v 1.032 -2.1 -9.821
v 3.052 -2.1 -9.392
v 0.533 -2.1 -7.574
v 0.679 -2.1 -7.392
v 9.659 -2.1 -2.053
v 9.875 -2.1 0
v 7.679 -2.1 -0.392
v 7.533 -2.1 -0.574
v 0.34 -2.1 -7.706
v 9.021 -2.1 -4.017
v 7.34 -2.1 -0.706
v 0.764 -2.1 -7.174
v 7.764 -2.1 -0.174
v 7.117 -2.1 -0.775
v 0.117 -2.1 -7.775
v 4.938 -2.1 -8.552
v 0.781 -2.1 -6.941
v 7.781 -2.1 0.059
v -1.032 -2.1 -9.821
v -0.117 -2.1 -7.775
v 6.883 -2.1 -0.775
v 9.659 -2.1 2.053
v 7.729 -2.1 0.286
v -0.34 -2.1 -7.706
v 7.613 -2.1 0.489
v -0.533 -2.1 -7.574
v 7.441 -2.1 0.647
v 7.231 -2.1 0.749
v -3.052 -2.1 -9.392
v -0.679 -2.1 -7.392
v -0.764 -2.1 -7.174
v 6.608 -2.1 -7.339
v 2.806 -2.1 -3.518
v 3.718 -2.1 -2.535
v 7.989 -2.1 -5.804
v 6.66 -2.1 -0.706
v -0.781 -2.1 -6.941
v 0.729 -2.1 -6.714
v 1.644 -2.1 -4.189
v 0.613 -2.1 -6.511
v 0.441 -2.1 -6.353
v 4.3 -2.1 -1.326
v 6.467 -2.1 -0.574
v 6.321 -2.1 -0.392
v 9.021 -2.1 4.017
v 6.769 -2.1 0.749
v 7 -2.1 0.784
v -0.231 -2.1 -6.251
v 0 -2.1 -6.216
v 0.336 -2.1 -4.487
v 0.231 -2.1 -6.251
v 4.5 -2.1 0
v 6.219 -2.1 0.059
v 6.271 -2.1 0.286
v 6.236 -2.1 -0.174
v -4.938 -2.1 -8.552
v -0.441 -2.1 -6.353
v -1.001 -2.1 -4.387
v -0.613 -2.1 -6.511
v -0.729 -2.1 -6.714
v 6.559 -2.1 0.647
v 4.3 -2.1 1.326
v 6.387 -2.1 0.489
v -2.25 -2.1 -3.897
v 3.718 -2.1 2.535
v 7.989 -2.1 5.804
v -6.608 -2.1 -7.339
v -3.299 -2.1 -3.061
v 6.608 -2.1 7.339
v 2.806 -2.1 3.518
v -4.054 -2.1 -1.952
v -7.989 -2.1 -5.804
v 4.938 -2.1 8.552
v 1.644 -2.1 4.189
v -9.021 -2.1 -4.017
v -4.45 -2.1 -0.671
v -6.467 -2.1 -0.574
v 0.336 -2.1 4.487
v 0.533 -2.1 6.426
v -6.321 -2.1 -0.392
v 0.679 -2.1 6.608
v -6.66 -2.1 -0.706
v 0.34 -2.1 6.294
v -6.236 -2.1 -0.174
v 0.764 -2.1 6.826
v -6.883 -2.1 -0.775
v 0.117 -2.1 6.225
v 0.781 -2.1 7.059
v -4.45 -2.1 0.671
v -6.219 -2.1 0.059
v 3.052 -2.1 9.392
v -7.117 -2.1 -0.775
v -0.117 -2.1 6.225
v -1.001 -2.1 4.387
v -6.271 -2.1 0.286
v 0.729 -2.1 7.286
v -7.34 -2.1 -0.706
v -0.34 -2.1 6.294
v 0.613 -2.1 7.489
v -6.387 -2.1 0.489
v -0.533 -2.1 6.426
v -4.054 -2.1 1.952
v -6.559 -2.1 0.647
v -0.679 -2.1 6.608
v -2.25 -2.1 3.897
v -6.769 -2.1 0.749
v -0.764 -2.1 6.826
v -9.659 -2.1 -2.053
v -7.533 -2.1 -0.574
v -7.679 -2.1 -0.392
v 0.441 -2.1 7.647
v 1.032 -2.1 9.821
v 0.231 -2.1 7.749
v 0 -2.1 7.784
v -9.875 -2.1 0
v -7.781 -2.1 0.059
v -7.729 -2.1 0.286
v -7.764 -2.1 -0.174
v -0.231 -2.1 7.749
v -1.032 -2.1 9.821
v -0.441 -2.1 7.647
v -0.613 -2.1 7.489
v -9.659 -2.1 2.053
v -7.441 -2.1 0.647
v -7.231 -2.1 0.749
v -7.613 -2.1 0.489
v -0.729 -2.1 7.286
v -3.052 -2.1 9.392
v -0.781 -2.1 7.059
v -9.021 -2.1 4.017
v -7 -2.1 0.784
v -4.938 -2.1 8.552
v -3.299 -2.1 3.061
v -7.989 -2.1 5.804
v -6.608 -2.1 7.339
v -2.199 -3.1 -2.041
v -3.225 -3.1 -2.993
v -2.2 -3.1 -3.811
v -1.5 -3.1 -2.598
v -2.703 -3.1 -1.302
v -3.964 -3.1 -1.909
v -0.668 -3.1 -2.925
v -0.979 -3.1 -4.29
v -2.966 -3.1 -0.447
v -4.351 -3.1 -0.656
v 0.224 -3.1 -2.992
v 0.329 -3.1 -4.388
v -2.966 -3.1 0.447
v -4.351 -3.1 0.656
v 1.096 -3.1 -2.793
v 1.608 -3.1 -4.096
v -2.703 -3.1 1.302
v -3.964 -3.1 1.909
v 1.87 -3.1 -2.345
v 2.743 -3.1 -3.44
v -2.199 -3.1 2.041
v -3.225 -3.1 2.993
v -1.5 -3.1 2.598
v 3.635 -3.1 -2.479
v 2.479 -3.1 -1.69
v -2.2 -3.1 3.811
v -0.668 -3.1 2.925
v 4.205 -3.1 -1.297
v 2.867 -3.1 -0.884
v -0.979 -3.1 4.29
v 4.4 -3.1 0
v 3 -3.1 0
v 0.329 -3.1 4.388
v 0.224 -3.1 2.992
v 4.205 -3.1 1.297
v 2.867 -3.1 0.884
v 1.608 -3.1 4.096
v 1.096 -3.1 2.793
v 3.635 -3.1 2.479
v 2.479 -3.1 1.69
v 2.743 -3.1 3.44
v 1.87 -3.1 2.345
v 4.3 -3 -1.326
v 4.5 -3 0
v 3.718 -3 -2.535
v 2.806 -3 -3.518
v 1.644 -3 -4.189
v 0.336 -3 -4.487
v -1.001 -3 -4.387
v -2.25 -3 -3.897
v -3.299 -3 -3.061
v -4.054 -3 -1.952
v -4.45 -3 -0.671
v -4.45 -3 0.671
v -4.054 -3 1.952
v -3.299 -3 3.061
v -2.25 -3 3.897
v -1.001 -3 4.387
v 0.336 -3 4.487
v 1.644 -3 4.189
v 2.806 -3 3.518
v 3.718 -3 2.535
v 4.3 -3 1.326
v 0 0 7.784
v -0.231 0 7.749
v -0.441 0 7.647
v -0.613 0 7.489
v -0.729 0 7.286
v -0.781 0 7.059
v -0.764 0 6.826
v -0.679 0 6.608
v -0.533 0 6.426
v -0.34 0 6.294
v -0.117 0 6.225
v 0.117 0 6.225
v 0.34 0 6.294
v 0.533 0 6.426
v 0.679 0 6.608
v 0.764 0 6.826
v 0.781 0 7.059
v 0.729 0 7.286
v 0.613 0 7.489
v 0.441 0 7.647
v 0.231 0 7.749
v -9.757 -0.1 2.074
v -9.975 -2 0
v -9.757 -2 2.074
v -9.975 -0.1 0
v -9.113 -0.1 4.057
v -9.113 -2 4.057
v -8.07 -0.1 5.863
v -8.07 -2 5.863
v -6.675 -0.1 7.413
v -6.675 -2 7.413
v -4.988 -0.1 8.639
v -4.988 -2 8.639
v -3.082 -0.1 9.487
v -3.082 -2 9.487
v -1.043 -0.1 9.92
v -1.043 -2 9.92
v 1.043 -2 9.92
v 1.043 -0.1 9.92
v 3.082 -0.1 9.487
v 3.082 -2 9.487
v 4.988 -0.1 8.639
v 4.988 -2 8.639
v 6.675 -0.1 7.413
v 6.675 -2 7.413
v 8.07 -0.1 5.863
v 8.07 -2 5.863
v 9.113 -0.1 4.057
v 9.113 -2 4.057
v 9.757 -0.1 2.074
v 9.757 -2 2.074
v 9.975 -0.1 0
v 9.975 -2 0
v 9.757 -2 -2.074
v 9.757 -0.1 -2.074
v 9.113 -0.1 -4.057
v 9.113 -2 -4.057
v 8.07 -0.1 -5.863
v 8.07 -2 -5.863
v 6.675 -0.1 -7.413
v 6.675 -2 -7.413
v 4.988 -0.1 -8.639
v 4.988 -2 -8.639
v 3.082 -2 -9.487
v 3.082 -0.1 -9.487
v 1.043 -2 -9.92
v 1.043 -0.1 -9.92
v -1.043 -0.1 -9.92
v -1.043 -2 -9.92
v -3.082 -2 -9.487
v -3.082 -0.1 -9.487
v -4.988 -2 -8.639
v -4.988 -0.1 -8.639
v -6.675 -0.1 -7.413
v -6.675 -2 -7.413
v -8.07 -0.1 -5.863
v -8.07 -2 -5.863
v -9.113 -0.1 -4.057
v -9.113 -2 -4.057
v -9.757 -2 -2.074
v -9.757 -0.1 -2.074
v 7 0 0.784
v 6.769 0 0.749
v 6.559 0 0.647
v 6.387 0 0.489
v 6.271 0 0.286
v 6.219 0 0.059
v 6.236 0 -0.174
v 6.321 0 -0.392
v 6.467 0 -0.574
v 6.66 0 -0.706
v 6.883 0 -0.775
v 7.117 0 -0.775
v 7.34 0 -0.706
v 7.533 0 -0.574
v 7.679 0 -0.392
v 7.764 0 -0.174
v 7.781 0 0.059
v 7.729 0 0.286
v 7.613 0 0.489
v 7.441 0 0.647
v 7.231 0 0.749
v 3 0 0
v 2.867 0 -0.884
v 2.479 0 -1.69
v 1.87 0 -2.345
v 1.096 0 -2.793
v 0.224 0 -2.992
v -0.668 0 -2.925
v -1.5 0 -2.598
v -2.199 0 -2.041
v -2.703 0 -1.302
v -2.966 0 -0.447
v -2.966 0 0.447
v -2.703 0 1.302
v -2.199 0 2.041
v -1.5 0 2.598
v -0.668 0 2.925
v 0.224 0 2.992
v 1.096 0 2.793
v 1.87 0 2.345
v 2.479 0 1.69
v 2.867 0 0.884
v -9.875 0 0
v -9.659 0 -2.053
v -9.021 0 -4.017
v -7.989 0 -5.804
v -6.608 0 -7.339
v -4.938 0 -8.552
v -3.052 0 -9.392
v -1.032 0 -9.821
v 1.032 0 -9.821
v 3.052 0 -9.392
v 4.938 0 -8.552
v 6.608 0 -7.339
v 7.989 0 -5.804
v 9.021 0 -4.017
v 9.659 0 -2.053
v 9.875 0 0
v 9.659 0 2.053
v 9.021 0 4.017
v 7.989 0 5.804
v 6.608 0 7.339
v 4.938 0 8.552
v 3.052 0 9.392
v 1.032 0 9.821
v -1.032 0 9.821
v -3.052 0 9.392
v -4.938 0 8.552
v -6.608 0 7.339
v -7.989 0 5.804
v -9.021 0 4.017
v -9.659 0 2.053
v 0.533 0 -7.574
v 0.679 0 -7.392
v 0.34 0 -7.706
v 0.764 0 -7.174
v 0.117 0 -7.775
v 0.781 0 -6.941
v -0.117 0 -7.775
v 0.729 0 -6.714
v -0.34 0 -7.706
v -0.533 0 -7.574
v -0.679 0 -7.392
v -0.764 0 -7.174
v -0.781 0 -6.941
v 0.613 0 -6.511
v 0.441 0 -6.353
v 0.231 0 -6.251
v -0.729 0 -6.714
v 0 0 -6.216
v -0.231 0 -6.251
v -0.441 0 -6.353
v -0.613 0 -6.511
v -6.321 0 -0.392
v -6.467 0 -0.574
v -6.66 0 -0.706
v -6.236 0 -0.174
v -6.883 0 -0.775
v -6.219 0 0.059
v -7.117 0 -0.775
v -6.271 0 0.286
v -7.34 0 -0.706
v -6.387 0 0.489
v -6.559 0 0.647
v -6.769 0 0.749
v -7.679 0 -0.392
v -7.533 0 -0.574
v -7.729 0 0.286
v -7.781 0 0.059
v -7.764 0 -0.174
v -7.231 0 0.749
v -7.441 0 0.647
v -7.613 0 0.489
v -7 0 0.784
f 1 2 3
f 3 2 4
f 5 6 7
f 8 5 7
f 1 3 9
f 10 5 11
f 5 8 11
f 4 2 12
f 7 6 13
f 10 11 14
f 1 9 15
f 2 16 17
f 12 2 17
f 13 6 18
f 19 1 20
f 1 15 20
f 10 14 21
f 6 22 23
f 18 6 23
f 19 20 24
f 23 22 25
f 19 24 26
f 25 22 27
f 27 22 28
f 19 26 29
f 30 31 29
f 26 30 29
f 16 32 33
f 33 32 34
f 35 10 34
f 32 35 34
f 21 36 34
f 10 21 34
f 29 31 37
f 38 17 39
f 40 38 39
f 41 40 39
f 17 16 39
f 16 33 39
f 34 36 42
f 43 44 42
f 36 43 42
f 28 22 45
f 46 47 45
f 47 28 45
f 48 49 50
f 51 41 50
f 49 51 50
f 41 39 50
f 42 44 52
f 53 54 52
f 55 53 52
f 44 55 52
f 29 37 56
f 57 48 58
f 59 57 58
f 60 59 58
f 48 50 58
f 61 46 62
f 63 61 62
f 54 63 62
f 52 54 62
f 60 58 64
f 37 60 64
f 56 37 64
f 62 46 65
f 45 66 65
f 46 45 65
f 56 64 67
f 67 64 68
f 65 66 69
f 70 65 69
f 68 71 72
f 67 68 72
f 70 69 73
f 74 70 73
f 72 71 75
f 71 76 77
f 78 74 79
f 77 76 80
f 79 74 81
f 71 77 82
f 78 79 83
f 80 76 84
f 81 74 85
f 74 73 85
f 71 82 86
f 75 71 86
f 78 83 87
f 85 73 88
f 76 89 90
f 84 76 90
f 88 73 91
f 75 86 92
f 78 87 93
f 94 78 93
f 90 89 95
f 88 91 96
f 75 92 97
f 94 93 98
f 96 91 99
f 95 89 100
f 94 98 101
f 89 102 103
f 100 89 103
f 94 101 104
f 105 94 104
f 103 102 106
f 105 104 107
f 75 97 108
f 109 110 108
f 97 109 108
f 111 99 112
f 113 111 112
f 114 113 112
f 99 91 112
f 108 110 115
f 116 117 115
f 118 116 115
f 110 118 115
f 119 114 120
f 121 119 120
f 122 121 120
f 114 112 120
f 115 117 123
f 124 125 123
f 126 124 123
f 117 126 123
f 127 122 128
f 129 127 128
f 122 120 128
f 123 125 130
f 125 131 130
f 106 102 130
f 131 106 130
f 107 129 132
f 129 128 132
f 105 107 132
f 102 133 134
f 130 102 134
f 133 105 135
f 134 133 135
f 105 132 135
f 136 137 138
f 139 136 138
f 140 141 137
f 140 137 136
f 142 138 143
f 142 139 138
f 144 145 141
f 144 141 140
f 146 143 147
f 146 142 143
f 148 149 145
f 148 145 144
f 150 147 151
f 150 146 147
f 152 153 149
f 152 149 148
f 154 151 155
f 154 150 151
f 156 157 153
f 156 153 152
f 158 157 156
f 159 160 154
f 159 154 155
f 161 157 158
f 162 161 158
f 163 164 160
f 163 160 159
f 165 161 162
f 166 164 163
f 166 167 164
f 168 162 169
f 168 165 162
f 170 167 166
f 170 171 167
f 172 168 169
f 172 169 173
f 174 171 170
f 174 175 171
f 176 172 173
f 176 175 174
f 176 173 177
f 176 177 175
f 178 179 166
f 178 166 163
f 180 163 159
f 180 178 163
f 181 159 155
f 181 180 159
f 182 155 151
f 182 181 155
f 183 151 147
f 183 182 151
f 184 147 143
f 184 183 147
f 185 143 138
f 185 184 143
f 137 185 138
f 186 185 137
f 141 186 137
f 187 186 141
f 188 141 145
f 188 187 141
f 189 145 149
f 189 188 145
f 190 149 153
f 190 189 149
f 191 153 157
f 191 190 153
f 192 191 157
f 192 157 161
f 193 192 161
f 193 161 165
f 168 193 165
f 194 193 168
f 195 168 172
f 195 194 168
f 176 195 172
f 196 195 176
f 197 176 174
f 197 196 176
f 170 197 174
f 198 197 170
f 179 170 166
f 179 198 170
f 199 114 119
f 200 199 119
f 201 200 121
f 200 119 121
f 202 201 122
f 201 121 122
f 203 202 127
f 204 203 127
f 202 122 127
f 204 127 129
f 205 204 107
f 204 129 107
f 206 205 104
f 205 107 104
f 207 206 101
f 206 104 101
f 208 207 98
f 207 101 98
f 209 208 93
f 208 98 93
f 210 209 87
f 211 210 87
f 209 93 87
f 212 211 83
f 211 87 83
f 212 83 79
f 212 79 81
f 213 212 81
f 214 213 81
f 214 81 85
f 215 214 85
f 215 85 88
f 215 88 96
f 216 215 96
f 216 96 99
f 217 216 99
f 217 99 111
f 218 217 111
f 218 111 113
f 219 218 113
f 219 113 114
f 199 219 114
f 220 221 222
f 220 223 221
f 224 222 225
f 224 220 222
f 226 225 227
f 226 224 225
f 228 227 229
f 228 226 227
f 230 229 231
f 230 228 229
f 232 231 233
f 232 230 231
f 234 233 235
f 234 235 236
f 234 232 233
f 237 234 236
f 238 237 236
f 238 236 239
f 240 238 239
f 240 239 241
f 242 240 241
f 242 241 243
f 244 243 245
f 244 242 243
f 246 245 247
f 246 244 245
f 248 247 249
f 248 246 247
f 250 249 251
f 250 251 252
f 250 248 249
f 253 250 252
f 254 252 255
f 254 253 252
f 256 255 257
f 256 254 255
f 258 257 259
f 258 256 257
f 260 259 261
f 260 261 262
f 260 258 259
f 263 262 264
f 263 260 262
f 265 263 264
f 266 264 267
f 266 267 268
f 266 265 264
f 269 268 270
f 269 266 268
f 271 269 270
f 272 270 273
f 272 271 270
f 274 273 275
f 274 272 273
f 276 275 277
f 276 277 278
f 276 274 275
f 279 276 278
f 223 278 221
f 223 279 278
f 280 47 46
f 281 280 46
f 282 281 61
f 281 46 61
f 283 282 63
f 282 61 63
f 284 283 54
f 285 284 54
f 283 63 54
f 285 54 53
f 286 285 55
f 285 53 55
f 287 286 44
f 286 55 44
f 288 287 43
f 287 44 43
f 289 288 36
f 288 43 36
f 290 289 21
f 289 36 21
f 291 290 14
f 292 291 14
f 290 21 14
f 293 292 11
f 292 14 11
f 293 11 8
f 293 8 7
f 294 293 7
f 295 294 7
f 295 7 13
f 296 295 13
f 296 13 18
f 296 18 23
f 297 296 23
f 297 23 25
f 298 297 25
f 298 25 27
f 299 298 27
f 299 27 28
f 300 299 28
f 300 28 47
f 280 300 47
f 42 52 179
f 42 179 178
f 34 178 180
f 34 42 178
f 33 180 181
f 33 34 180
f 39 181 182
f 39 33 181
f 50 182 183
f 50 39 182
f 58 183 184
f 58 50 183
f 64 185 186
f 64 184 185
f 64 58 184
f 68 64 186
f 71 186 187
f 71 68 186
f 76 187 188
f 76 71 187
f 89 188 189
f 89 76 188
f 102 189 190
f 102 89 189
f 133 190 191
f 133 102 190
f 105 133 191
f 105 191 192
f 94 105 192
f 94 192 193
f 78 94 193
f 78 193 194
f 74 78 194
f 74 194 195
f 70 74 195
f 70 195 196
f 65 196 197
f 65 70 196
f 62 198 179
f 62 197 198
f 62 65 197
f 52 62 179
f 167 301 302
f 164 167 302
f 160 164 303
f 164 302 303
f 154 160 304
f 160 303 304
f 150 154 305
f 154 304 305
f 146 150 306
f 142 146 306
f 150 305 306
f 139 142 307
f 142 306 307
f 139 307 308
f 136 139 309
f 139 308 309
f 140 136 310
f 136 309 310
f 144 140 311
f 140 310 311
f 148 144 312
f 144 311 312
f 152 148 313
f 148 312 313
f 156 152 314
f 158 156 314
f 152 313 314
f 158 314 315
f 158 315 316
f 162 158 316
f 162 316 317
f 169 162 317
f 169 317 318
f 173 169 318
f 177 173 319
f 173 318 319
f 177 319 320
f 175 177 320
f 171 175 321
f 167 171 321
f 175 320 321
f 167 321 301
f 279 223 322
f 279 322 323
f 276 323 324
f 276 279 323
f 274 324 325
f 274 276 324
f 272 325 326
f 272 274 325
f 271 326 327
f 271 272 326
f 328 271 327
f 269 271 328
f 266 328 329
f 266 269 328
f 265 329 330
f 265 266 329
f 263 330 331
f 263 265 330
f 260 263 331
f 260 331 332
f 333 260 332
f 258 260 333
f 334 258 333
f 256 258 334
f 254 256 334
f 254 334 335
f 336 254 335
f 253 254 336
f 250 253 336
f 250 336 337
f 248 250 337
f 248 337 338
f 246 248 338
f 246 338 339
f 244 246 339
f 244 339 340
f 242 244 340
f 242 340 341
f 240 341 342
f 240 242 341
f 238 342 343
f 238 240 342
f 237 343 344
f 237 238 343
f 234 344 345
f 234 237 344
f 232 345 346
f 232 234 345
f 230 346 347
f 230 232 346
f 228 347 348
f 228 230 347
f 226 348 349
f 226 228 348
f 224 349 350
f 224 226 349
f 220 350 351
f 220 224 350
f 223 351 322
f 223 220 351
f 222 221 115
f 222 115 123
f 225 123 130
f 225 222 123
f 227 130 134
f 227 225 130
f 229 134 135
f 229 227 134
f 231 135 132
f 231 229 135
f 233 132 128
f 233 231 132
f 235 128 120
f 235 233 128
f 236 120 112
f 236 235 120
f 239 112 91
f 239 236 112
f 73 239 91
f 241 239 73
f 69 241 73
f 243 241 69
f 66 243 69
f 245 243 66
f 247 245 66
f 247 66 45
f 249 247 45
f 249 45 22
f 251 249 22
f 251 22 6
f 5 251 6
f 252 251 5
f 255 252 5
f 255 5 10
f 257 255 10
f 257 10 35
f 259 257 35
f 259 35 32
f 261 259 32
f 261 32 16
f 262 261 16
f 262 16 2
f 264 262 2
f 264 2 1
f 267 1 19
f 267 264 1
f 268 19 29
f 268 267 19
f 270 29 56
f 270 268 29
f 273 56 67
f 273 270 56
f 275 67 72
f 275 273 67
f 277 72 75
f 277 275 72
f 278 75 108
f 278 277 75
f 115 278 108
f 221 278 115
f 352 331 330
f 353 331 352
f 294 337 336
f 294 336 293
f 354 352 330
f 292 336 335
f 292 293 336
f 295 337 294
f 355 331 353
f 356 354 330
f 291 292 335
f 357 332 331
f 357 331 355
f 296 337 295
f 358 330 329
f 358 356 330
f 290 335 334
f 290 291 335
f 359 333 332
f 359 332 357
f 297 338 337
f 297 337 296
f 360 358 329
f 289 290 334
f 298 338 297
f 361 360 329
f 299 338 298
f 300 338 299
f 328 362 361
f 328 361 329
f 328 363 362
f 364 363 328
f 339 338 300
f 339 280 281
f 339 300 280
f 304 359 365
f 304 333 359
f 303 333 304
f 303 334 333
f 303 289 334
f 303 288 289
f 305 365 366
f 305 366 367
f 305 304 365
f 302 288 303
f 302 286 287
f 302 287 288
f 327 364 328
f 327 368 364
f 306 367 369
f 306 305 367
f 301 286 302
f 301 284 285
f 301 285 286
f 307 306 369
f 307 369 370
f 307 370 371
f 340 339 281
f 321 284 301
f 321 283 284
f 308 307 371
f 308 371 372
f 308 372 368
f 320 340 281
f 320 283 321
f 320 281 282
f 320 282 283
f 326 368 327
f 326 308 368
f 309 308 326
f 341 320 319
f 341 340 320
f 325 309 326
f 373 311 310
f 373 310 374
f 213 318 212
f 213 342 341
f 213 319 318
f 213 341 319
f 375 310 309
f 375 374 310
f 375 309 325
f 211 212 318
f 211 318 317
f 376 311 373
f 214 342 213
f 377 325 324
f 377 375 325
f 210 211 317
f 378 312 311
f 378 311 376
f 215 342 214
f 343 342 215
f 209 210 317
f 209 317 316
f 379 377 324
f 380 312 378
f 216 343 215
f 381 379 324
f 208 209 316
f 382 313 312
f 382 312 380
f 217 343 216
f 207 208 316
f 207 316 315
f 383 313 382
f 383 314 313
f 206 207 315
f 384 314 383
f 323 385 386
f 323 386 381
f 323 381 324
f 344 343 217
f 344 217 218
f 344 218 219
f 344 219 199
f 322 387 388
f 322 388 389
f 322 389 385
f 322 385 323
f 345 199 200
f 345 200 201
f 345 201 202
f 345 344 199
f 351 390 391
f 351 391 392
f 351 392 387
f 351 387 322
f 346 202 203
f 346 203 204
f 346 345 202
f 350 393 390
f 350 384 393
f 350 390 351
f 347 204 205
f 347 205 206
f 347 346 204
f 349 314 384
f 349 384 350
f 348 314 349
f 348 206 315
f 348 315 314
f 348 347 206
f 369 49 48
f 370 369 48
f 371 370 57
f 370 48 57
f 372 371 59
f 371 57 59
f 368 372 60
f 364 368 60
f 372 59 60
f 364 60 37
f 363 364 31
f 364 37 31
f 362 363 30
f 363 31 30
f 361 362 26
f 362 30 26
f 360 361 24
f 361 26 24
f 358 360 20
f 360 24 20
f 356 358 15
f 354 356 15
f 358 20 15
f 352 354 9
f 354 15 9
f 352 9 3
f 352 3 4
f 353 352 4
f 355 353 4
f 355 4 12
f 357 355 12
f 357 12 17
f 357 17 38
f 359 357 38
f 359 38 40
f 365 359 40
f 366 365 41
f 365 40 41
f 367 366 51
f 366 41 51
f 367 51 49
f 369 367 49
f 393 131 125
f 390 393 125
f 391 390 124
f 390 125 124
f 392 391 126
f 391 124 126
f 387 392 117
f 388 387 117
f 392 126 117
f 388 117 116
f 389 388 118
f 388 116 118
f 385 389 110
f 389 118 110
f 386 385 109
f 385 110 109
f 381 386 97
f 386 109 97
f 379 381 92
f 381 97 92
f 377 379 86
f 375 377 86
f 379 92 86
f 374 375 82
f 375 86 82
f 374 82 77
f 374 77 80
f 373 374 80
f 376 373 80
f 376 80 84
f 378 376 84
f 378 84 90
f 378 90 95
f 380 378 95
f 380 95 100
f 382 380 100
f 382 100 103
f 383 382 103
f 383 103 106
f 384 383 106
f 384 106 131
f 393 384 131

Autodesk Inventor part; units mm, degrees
ref_plane "YZ Plane" through (0, 0, 0) normal (1, 0, 0) x (0, 1, 0)
ref_plane "XZ Plane" through (0, 0, 0) normal (0, 1, 0) x (-1, 0, 0)
ref_plane "XY Plane" through (0, 0, 0) normal (0, 0, 1) x (1, 0, 0)
sketch "Sketch1" plane through (0, 0, 0) normal (0, 1, 0) x (-1, 0, 0)
  circle A0 centre (0, 0) radius 9.975
  dimension "d0" = 19.95
extrude "Extrusion1" add sketch "Sketch1" against normal blind 2.1
sketch "Sketch2" plane through (0, -2.1, 0) normal (0, -1, 0) x (1, 0, 0)
  circle A0 centre (0, 0) radius 4.5
  dimension "d3" = 9
extrude "Extrusion2" add sketch "Sketch2" along normal blind 1
sketch "Sketch3" plane through (0, 0, 0) normal (0, 1, 0) x (1, 0, 0)
  circle A0 centre (0, 0) radius 3
  dimension "d6" = 6
extrude "Extrusion3" cut sketch "Sketch3" against normal through all
chamfer "Chamfer1" distance 0.1 angle 45 3 edges at (9.975, 0, 0) (9.975, -2.1, 0) (-4.5, -3.1, 0)
sketch "Sketch4" plane through (0, 0, 0) normal (0, 1, 0) x (1, 0, 0)
  circle A0 centre (0, 0) radius 7
  point P0 (-7, 0)
  point P1 (7, 0)
  point P2 (0, -7)
  point P3 (0, 7)
  dimension "d12" = 14
hole "Hole1" at (7, 0, 0) at (0, 0, 7) at (0, 0, -7) at (-7, 0, 0) direction (0, -1, 0) diameter 1.567 end through all thread size "M2x0.4" class "6H" standard "ISO Metric profile"
properties part number "Bottom Horn" material "Aluminum 6061"
